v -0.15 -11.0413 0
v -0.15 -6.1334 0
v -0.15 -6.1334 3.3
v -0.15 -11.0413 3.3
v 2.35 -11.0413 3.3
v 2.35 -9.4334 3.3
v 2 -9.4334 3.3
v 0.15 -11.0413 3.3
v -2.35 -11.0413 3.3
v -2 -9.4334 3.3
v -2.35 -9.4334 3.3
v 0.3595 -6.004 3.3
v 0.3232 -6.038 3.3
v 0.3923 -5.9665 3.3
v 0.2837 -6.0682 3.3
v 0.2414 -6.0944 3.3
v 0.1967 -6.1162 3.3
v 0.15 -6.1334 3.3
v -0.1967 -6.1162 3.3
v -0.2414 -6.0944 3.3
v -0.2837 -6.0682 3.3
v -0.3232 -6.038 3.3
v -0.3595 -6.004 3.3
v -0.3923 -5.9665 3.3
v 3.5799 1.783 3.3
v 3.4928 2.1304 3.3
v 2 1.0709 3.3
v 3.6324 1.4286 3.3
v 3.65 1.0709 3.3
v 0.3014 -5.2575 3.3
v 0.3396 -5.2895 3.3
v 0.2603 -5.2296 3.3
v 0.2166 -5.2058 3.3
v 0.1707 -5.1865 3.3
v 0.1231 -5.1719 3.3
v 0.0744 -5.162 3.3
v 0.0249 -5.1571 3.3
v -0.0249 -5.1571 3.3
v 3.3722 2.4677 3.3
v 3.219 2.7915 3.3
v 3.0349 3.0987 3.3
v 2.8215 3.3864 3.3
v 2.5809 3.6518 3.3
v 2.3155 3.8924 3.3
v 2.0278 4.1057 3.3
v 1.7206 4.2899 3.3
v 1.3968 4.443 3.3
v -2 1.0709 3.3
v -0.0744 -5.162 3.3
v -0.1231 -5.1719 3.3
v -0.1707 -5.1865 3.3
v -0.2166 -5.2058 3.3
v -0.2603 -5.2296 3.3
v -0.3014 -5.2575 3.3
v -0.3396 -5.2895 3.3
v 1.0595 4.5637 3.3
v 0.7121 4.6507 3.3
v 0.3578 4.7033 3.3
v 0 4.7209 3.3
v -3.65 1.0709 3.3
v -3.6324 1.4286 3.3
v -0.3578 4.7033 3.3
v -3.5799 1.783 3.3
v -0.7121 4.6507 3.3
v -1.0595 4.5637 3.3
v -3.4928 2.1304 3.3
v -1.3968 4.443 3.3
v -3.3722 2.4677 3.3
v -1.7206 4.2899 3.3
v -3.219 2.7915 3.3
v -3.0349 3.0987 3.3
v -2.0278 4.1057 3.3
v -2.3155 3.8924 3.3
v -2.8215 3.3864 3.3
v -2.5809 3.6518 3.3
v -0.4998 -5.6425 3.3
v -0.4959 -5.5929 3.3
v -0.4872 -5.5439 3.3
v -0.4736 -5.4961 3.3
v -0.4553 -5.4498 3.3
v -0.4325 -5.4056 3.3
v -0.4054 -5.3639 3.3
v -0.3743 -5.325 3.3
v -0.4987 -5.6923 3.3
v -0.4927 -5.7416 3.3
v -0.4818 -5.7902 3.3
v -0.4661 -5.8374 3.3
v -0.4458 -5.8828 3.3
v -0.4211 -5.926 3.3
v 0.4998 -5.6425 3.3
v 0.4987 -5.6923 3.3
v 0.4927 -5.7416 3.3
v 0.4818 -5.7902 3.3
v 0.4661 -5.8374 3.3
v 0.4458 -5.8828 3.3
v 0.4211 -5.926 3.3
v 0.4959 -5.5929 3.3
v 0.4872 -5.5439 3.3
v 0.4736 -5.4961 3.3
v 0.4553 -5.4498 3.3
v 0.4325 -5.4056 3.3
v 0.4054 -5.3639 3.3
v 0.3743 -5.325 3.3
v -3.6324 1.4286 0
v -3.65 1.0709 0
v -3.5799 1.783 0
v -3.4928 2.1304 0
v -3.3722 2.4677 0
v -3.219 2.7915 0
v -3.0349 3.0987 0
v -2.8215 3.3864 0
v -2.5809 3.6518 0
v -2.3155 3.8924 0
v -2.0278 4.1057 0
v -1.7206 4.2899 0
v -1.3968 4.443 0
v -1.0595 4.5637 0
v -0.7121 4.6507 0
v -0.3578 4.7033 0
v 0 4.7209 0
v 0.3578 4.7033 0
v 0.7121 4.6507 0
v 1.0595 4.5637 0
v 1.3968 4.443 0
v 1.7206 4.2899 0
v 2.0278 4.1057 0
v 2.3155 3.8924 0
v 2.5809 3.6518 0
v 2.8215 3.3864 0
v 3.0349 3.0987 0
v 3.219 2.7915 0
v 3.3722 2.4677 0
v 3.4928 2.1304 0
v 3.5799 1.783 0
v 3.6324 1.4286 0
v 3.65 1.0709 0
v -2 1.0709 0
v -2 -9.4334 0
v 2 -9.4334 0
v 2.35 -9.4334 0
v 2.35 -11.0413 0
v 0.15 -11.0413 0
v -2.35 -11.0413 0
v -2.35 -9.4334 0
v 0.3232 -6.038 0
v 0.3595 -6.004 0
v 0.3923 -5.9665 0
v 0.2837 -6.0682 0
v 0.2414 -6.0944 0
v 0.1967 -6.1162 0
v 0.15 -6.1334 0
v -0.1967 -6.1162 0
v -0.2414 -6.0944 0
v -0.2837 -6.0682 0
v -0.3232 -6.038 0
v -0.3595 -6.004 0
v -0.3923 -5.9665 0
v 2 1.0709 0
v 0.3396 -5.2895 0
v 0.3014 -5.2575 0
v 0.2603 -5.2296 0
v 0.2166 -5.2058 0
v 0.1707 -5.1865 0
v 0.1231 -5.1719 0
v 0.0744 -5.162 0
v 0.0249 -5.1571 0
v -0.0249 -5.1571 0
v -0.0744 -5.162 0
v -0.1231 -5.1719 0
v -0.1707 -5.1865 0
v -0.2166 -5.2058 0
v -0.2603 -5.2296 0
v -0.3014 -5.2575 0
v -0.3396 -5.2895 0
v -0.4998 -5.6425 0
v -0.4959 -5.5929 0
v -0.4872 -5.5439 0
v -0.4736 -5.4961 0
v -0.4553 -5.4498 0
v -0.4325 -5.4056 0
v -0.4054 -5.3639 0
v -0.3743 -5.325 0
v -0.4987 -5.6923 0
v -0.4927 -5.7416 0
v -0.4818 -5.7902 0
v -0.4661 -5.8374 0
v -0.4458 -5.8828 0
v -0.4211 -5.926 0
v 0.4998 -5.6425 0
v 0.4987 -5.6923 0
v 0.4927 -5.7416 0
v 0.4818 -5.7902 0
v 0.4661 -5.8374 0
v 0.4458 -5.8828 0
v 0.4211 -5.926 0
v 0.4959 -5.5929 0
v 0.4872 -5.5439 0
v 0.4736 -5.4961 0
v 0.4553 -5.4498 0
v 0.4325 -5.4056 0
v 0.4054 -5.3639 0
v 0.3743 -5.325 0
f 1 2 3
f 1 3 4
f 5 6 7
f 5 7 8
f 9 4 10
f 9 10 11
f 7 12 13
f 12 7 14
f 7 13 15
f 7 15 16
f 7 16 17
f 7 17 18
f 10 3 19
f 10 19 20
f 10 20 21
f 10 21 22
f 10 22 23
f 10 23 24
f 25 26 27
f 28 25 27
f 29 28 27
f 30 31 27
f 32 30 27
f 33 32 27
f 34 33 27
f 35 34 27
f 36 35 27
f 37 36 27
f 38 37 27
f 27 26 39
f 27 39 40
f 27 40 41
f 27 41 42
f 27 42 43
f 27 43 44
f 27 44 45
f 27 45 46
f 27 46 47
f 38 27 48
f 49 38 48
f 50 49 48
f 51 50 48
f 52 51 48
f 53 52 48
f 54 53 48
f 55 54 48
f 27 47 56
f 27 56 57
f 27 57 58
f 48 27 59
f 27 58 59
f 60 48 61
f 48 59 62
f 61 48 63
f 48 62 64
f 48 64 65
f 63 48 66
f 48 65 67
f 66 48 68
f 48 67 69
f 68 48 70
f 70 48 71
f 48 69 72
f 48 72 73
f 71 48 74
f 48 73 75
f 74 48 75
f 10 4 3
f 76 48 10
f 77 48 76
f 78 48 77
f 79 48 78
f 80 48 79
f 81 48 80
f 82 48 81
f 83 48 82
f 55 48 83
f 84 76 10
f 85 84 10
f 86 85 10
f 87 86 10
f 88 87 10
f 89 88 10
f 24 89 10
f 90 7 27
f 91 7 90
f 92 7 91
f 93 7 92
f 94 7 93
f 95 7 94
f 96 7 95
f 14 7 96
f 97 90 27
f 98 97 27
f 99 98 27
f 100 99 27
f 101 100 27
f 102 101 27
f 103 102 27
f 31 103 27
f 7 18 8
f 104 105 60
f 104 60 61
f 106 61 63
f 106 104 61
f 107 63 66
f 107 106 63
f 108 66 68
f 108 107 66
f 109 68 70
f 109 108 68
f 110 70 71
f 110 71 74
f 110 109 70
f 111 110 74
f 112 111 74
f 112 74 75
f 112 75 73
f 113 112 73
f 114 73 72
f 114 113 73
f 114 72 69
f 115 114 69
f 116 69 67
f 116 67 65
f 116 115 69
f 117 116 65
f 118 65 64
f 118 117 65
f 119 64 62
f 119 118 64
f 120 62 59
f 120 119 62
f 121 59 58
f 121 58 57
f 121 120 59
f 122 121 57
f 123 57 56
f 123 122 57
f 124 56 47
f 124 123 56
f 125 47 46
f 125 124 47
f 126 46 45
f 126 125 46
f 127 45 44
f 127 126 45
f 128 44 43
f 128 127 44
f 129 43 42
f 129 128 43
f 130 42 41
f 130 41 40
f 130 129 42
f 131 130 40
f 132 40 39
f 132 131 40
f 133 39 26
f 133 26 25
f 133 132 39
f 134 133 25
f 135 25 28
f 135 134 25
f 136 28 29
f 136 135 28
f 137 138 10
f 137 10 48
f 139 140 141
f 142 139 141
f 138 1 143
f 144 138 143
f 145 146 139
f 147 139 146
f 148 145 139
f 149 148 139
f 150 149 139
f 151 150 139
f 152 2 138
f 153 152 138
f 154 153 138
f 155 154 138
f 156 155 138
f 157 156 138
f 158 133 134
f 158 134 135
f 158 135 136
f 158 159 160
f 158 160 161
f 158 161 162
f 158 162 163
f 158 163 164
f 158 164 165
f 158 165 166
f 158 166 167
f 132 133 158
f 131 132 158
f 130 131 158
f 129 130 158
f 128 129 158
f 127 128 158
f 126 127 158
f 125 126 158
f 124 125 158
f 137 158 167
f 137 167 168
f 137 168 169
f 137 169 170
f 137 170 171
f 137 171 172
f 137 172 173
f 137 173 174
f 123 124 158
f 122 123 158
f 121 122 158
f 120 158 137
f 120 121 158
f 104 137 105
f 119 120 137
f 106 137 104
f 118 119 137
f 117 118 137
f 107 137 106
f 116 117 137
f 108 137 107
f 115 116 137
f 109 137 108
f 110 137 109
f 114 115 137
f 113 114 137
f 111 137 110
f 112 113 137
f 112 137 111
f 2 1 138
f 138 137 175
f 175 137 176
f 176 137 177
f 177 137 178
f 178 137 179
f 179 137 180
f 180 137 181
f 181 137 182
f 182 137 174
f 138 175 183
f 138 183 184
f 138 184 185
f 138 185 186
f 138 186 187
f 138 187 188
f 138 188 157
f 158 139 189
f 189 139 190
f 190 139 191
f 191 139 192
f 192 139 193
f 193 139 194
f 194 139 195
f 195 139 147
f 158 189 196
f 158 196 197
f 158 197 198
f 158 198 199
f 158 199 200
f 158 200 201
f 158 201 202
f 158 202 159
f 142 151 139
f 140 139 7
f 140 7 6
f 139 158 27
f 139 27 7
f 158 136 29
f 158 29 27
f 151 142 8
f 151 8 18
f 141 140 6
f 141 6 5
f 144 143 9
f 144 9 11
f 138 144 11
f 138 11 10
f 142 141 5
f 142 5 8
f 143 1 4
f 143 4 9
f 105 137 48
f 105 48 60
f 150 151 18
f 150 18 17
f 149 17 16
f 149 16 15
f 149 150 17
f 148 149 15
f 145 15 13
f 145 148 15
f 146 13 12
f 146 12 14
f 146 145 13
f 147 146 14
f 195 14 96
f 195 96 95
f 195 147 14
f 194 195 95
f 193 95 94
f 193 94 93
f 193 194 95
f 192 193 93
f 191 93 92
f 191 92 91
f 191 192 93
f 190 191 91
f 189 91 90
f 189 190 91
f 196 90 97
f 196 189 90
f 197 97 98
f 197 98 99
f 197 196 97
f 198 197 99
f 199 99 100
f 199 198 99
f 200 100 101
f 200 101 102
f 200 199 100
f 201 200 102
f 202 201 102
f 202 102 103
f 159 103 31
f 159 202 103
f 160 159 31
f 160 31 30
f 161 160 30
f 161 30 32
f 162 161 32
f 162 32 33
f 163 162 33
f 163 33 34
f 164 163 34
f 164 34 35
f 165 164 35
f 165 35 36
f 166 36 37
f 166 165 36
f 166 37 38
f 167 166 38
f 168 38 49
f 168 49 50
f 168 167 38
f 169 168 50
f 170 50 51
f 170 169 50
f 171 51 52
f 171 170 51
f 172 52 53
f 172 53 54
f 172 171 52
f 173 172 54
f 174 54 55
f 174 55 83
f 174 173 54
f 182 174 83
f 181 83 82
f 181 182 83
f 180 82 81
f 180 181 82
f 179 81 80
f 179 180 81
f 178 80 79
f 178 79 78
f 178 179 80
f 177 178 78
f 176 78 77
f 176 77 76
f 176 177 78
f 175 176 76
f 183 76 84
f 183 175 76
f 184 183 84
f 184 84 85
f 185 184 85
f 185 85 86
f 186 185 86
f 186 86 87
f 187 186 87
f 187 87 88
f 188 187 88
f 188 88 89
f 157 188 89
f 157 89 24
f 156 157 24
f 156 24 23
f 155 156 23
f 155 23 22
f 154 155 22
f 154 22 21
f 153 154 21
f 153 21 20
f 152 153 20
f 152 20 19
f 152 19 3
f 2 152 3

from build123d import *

# Parameters (mm, degrees)
SALIENTE_EXTRUIR1_DEPTH = 3.3


with BuildPart() as part:
    # Croquis1 → Saliente-Extruir1 (new body)
    with BuildSketch(Plane.XY):
        with BuildLine():
            Line((-0.15, -6.133444496), (-0.15, -9.433444496))
            Line((-0.15, -9.433444496), (-0.15, -11.04132323))
            Line((-0.15, -11.04132323), (-2.35, -11.04132323))
            Line((-2.35, -11.04132323), (-2.35, -9.433444496))
            Line((-2.35, -9.433444496), (-2, -9.433444496))
            Line((-2, -9.433444496), (-2, 1.070879644))
            Line((-2, 1.070879644), (-3.65, 1.070879644))
            ThreePointArc((-3.65, 1.070879644), (0, 4.720879644), (3.65, 1.070879644))
            Line((3.65, 1.070879644), (2, 1.070879644))
            Line((2, 1.070879644), (2, -9.433444496))
            Line((2, -9.433444496), (2.35, -9.433444496))
            Line((2.35, -9.433444496), (2.35, -11.04132323))
            Line((2.35, -11.04132323), (0.15, -11.04132323))
            Line((0.15, -11.04132323), (0.15, -9.433444496))
            Line((0.15, -9.433444496), (0.15, -6.133444496))
            ThreePointArc((0.15, -6.133444496), (0, -5.156474895), (-0.15, -6.133444496))
        make_face()
    extrude(amount=SALIENTE_EXTRUIR1_DEPTH)


solid = part.part
